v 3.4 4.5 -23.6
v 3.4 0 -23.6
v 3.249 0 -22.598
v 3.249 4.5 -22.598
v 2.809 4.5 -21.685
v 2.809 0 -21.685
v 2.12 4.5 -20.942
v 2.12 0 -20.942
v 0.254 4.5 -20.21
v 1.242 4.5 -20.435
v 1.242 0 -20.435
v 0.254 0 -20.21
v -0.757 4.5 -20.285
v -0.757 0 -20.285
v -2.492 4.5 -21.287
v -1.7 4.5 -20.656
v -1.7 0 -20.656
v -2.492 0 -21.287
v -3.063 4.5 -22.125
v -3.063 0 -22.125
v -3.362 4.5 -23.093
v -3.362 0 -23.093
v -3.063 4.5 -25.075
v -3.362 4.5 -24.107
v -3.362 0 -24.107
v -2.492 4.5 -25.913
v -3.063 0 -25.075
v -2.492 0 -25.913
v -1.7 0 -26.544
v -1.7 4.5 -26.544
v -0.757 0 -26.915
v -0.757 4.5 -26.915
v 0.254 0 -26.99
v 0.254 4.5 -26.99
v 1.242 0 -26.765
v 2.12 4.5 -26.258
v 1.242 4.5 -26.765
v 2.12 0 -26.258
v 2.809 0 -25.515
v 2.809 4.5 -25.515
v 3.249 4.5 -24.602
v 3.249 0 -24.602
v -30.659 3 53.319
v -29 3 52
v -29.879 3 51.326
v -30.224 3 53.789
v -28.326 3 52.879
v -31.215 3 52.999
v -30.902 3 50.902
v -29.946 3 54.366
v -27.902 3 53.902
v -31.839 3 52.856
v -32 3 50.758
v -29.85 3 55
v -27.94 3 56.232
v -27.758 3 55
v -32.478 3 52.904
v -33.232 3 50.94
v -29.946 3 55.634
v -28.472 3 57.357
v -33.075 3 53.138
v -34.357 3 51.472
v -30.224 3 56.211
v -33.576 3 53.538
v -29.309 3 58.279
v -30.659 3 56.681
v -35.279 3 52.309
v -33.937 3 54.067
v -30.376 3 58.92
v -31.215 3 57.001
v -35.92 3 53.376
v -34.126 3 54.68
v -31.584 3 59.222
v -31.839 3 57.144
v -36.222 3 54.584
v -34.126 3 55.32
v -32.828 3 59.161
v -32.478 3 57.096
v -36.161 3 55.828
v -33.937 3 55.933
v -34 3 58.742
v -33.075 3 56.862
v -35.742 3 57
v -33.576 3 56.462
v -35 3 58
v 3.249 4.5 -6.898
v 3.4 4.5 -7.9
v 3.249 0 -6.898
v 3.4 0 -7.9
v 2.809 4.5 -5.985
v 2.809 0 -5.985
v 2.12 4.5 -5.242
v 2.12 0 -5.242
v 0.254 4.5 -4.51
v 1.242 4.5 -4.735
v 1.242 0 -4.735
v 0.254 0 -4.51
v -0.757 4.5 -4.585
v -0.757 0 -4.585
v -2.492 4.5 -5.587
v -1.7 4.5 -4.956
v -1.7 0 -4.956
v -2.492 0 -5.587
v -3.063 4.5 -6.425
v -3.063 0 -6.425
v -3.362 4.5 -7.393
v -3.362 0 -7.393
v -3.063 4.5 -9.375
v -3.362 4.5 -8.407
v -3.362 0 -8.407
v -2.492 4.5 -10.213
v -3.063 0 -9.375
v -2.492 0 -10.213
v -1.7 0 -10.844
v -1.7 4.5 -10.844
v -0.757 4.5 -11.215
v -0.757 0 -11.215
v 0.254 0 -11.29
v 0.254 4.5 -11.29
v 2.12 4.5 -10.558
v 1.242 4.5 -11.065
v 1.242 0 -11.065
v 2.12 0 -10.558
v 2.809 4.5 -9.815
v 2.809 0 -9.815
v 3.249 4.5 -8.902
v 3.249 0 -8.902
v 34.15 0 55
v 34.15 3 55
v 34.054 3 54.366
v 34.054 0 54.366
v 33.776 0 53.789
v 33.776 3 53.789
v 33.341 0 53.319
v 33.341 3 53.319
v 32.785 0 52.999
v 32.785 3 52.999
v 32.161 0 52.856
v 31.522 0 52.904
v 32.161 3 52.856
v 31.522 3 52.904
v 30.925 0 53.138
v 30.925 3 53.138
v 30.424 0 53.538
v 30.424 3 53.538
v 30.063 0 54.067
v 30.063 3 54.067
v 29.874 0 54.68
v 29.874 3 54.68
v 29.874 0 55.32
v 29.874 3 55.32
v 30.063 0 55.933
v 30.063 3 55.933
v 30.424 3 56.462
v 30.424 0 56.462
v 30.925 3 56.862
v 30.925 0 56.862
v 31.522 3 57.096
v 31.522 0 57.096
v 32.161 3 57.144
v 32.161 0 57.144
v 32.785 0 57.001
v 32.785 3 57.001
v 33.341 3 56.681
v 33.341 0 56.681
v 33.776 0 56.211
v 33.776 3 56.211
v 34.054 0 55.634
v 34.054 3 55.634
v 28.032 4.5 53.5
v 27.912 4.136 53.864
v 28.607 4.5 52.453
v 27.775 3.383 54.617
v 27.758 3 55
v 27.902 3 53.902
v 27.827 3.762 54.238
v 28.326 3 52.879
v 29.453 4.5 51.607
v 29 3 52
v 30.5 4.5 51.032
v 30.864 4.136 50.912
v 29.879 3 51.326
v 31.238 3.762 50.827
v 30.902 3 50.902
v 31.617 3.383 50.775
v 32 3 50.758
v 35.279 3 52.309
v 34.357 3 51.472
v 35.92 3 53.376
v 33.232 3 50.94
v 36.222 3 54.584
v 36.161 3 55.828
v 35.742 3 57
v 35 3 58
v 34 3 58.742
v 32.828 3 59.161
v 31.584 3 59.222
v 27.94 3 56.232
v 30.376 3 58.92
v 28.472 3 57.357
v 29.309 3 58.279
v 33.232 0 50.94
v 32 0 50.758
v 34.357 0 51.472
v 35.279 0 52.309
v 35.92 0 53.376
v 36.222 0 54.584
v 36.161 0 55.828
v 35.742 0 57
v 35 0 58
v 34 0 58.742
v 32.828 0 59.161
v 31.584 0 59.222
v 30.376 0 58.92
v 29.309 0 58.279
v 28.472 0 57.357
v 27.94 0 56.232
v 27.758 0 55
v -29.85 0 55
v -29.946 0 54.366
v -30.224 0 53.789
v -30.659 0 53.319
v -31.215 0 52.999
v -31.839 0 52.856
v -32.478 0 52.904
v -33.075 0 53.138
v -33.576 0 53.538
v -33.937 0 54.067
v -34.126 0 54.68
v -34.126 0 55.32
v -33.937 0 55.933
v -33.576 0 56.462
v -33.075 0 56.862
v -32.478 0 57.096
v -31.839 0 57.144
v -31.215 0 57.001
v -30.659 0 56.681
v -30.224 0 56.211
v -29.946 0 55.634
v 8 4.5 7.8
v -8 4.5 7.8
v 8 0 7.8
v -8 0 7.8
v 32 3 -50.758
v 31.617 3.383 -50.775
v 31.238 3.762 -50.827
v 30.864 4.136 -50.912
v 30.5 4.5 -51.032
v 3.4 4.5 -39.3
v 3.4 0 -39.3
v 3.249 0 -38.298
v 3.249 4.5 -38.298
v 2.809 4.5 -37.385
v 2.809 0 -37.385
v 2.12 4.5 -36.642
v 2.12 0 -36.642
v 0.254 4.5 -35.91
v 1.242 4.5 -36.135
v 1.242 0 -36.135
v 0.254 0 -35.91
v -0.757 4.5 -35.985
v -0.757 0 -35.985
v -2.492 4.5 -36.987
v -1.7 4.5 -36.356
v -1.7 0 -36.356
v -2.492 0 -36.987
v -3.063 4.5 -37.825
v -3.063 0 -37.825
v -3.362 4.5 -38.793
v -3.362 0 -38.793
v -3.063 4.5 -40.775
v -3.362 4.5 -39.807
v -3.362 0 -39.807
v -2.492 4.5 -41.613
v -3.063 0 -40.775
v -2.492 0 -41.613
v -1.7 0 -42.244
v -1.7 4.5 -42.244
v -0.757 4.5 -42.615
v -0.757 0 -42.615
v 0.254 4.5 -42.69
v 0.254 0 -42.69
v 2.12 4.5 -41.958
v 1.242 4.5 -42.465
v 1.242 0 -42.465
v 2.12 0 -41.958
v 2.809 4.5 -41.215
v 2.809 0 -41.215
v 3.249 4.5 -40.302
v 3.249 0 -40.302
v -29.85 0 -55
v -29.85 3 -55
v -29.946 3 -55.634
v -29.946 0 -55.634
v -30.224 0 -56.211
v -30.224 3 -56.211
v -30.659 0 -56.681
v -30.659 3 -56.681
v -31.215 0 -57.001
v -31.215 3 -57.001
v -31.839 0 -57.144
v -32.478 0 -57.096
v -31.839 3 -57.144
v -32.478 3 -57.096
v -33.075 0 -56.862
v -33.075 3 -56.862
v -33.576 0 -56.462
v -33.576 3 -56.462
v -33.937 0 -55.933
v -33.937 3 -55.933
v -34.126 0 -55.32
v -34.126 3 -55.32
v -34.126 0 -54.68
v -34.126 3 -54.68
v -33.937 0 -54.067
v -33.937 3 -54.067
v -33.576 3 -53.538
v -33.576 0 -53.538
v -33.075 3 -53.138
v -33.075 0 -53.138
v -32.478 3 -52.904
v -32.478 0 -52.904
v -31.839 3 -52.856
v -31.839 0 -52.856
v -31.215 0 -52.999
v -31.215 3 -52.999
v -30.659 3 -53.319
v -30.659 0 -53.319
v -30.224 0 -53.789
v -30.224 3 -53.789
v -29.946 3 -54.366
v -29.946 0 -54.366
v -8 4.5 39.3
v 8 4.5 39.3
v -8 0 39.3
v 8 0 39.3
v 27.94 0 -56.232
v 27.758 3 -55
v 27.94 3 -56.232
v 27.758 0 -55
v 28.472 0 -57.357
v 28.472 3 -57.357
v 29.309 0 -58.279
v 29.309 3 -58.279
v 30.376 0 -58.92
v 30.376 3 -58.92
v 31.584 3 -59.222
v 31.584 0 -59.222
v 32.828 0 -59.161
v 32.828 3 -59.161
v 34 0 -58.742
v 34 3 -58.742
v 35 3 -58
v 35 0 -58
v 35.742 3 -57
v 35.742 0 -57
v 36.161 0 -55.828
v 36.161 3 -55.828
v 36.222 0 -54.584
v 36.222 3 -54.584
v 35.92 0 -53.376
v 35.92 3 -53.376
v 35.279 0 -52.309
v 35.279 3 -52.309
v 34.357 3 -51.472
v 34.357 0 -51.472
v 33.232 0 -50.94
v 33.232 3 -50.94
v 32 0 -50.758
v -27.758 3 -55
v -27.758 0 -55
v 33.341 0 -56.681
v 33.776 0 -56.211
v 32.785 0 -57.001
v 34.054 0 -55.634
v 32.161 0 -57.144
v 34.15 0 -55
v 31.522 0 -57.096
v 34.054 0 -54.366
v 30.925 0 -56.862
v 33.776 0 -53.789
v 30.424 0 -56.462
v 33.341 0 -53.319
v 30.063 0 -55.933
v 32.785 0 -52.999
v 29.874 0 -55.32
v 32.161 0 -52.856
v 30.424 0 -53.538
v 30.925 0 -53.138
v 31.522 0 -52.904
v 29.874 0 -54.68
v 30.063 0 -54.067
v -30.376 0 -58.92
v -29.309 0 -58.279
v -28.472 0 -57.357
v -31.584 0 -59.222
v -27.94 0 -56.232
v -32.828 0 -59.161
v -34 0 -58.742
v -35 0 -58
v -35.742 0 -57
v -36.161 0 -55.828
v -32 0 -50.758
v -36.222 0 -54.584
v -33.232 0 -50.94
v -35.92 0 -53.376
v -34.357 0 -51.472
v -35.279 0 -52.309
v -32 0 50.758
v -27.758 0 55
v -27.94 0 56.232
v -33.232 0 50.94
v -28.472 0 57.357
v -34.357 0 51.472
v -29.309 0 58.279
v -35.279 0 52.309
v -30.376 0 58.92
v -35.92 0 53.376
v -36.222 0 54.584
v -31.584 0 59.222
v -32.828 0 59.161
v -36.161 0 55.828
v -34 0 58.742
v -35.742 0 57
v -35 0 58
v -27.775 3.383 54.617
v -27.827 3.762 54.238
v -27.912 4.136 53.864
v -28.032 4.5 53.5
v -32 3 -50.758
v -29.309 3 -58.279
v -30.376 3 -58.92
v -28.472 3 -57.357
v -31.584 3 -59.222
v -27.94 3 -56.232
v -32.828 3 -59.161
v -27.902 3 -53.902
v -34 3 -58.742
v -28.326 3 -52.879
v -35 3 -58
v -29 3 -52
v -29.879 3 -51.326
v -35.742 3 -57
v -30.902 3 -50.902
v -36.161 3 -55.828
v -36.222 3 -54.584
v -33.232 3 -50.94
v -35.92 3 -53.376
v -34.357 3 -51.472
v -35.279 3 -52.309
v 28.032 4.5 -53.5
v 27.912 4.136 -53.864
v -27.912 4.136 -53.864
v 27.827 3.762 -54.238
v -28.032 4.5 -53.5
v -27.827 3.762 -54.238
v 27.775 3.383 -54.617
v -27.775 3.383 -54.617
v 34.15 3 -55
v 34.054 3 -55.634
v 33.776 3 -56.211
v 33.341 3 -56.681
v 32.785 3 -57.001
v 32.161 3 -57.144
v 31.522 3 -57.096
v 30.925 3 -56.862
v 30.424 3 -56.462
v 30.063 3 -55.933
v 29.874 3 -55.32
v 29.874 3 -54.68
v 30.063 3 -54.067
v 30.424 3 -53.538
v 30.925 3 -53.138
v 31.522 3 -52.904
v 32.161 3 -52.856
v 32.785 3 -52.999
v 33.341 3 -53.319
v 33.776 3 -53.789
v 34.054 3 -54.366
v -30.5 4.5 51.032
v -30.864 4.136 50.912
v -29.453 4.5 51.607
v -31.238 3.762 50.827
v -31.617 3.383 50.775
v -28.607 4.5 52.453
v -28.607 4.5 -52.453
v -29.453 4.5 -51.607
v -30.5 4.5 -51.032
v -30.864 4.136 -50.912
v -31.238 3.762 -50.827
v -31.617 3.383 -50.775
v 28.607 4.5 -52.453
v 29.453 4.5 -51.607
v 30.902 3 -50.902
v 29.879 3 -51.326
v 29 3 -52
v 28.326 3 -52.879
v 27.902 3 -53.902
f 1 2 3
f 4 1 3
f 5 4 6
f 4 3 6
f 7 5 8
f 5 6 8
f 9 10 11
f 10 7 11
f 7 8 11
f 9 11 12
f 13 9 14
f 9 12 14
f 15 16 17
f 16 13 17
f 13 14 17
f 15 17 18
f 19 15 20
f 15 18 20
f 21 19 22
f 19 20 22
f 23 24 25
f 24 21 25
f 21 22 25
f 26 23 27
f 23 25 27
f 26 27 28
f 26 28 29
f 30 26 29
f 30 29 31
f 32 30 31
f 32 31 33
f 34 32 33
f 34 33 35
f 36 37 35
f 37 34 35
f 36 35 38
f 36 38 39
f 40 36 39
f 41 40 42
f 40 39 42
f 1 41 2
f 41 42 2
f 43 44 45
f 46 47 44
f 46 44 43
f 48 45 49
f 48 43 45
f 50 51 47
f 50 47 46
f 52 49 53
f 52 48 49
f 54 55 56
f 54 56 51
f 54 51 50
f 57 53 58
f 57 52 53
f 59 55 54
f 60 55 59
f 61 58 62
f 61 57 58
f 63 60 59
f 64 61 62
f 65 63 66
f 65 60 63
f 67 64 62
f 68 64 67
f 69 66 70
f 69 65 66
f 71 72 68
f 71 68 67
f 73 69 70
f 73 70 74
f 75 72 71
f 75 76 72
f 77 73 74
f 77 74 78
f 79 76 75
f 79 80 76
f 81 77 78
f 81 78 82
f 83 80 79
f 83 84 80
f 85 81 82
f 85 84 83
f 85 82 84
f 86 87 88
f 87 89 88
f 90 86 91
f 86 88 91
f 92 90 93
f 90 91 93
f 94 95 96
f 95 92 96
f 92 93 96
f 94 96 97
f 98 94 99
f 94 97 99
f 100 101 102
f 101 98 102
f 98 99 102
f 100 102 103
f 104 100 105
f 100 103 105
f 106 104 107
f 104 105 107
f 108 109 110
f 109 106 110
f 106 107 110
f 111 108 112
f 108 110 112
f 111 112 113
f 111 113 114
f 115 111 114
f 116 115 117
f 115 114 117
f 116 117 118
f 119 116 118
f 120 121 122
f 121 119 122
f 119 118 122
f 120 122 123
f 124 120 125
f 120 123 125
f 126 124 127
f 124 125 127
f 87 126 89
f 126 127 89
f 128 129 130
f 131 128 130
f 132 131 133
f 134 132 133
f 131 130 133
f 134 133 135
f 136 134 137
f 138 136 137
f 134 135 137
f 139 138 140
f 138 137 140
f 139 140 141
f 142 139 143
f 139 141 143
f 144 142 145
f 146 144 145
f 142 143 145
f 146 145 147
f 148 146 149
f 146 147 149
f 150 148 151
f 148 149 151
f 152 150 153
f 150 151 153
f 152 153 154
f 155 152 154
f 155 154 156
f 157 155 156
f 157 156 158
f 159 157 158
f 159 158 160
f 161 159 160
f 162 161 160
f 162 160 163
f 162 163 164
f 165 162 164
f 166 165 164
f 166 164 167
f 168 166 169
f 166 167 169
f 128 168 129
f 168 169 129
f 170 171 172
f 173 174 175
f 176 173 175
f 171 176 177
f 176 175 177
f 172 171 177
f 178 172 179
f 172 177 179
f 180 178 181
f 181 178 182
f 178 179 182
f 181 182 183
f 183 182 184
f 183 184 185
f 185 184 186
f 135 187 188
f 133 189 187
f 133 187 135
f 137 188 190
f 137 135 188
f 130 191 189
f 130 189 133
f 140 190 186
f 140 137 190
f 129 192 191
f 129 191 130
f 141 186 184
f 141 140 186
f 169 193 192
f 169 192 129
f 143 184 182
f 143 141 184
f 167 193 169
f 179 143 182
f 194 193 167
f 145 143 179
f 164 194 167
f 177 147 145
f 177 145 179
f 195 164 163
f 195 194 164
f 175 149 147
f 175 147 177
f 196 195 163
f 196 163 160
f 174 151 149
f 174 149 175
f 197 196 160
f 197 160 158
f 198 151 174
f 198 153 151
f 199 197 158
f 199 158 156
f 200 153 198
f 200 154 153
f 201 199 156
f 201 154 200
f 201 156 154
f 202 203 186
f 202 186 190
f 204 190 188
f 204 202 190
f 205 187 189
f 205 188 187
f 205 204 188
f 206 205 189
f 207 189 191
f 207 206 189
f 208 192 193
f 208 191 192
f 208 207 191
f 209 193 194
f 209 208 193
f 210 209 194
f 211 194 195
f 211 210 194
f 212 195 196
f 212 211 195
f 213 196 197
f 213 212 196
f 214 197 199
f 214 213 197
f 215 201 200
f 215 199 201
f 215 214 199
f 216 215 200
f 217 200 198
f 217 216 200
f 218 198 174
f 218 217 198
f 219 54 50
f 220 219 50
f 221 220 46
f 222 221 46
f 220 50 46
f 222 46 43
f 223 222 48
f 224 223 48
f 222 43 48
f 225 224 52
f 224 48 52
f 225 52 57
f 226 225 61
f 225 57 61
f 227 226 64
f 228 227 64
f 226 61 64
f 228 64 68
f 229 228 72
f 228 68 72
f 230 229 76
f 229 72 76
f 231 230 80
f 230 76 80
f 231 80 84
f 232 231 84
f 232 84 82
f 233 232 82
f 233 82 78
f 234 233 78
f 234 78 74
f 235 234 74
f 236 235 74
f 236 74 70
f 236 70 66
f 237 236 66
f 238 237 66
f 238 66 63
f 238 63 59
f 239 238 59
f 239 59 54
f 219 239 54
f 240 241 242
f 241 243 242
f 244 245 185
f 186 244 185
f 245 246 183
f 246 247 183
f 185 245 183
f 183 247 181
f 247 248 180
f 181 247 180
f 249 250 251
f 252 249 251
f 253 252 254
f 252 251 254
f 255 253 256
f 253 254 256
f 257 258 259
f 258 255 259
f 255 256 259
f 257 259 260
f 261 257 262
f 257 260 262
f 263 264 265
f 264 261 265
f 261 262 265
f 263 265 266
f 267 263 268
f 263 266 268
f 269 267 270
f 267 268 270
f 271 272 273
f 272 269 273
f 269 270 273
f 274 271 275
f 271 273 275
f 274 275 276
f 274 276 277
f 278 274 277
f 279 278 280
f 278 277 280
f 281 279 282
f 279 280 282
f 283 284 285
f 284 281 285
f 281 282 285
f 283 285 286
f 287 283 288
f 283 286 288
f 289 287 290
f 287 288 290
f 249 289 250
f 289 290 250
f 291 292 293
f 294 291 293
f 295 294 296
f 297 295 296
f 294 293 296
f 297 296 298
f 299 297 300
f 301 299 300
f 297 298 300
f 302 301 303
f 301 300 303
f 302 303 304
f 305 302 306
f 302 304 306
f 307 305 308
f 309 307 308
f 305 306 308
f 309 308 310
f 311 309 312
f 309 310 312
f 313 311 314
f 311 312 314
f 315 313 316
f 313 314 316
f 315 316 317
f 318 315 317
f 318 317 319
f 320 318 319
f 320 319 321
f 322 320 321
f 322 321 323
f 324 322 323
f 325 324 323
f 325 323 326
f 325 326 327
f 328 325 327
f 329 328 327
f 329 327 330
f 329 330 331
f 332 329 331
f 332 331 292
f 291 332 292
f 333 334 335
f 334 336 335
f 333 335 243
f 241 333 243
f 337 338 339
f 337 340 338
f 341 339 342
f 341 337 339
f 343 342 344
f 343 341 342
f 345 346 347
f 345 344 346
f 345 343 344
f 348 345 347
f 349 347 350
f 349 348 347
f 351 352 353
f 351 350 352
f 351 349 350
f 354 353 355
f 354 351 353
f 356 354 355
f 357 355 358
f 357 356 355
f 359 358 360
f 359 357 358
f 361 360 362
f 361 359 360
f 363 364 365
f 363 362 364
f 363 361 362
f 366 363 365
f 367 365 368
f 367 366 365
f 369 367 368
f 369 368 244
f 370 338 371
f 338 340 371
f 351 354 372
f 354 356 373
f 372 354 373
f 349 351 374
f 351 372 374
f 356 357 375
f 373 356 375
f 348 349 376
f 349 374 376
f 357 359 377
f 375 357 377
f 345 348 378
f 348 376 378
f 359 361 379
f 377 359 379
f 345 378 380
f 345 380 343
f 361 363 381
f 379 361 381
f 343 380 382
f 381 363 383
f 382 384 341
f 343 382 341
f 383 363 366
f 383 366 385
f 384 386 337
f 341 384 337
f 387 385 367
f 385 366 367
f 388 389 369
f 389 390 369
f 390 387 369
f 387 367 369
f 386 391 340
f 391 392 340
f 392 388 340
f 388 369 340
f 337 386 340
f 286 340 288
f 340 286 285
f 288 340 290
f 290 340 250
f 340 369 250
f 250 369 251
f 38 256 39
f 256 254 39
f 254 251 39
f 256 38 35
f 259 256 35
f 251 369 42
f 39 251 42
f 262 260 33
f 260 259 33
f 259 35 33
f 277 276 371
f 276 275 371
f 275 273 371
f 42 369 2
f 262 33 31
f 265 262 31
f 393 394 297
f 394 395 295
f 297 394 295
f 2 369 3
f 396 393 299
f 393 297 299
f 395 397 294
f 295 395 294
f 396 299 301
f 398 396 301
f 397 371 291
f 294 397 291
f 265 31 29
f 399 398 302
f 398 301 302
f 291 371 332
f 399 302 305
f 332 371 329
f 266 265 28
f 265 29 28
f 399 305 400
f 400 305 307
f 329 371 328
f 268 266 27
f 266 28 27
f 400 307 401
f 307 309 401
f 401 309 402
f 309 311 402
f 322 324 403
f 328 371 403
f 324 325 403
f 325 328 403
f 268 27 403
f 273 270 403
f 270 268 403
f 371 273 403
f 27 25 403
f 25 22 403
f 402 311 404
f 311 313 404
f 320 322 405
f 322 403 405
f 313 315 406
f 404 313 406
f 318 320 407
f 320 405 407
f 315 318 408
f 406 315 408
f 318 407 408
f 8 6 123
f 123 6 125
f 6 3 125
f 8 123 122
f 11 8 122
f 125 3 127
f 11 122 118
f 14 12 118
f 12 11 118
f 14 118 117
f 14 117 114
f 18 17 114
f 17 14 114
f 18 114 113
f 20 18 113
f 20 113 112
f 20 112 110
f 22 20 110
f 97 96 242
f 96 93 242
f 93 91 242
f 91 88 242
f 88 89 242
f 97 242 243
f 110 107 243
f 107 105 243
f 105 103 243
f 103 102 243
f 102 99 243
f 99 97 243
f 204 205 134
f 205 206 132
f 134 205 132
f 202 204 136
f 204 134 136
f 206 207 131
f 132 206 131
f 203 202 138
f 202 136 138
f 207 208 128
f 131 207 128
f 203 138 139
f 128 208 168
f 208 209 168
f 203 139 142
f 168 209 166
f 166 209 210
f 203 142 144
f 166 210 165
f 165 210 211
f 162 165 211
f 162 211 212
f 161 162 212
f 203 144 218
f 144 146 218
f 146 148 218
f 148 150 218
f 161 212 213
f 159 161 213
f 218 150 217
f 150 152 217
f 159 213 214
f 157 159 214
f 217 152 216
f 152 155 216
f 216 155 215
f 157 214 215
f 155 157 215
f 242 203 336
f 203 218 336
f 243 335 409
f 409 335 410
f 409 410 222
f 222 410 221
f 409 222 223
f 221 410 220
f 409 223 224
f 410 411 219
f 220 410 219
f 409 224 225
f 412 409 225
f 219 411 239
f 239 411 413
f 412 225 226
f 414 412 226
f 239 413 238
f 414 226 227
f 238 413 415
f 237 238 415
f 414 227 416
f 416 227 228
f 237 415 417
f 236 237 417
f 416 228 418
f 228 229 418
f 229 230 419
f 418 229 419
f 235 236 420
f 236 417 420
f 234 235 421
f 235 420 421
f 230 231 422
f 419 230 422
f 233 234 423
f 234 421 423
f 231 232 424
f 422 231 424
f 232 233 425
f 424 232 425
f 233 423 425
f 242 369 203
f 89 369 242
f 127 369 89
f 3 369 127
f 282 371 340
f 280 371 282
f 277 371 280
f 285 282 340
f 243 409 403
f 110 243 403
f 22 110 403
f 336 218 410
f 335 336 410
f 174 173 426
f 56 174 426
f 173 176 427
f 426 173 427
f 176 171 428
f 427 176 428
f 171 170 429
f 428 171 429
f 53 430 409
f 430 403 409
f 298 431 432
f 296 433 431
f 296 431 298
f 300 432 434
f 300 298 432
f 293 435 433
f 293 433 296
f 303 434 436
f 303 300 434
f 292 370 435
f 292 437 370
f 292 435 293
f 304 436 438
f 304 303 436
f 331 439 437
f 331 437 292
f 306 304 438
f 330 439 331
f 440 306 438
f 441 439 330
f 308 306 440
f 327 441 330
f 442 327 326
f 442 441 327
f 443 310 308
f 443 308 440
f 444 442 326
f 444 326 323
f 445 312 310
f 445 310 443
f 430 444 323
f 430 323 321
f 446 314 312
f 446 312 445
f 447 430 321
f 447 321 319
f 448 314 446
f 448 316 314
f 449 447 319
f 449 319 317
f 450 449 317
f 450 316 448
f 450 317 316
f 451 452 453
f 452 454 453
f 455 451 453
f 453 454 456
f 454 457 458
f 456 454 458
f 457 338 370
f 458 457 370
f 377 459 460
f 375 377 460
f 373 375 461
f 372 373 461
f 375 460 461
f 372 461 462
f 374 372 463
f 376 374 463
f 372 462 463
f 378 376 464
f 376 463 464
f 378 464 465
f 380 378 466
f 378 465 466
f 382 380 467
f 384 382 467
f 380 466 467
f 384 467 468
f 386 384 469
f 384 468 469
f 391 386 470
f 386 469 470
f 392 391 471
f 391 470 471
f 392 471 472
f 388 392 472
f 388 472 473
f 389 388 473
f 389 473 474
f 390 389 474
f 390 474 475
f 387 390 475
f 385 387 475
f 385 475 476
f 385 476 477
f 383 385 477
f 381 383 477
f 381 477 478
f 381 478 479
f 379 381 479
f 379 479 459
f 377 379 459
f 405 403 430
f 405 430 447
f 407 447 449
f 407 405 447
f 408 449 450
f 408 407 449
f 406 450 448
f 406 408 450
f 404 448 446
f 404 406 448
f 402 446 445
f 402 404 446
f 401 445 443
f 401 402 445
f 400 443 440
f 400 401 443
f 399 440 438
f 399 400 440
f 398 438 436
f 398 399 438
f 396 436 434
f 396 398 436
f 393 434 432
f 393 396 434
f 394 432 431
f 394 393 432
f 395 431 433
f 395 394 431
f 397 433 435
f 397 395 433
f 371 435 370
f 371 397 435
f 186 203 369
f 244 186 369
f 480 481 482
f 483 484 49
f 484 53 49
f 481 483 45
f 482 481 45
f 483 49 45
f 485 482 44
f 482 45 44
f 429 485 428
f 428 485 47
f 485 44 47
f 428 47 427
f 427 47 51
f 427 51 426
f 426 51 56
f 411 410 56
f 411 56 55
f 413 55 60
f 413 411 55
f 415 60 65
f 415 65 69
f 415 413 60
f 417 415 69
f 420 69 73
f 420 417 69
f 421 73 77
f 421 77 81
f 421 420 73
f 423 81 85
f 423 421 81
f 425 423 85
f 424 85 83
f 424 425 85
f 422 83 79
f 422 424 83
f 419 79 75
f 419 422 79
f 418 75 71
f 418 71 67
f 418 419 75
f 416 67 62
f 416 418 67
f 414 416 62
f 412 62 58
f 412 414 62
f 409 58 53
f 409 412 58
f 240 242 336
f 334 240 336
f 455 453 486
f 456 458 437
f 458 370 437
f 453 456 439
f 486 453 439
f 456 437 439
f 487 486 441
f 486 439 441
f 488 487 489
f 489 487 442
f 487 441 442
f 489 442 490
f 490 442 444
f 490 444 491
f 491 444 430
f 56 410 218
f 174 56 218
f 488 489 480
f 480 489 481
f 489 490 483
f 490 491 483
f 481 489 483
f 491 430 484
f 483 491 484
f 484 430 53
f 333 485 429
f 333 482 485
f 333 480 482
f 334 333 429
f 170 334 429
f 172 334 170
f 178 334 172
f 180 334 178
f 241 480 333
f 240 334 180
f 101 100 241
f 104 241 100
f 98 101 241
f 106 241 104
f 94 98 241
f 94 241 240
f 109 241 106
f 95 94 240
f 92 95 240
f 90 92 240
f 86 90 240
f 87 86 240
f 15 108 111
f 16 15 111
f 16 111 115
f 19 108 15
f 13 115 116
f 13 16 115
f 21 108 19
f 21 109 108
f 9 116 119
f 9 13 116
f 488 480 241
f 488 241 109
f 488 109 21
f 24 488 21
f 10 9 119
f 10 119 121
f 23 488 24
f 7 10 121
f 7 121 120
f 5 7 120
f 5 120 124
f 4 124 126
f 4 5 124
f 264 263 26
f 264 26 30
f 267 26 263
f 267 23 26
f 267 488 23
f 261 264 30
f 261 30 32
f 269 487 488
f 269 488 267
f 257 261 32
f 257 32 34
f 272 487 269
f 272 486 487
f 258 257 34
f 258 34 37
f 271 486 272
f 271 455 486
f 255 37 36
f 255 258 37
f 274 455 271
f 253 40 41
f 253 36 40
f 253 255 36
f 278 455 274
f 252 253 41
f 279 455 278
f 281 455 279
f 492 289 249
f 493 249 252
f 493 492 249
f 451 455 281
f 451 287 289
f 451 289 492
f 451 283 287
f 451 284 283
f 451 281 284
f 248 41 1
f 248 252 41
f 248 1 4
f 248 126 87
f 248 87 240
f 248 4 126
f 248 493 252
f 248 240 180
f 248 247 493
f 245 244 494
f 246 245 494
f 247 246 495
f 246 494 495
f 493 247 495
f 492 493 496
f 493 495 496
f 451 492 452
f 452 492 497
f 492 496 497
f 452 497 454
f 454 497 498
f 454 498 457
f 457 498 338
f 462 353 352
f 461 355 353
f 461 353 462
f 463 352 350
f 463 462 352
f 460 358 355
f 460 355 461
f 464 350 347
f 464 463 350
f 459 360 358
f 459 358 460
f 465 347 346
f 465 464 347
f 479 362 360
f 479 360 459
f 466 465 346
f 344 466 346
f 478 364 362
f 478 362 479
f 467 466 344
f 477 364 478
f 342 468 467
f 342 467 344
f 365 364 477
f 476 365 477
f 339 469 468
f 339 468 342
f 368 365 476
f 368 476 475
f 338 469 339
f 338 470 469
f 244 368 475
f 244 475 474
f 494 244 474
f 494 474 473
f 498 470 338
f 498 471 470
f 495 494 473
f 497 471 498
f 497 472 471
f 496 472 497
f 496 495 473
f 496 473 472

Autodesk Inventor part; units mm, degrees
ref_plane "YZ Plane" through (0, 0, 0) normal (1, 0, 0) x (0, 1, 0)
ref_plane "XZ Plane" through (0, 0, 0) normal (0, 1, 0) x (-1, 0, 0)
ref_plane "XY Plane" through (0, 0, 0) normal (0, 0, 1) x (1, 0, 0)
sketch "Sketch1" plane through (0, 0, 0) normal (0, 1, 0) x (-1, 0, 0)
  line L0 (32, 55) -> (-32, 55)
  line L1 (-32, 55) -> (-32, -55)
  line L2 (-32, -55) -> (32, -55)
  line L3 (32, -55) -> (32, 55)
  line L4 (32, 55) -> (-32, -55) construction
  line L5 (-32, 55) -> (32, -55) construction
  circle A0 centre (32, 55) radius 4.2425
  circle A1 centre (32, -55) radius 4.2425
  circle A2 centre (-32, 55) radius 4.2425
  circle A3 centre (-32, -55) radius 4.2425
  point P0 (0, 0)
  dimension "d0" = 64
  dimension "d1" = 110
  dimension "d2" = 8.485
  dimension "d5" = 110
  dimension "d8" = 64
extrude "Extrusion1" add sketch "Sketch1" along normal blind 3
sketch "Sketch2" plane through (0, 3, 0) normal (0, 1, 0) x (1, 0, 0)
  line L0 (32, -50.7575) -> (32, 50.7575) projected
  arc A0 (32, 50.7575) -> (27.7575, 55) centre (32, 55) ccw projected
  line L1 (27.7575, 55) -> (-27.7575, 55) projected
  arc A1 (-27.7575, 55) -> (-32, 50.7575) centre (-32, 55) ccw projected
  line L2 (-32, 50.7575) -> (-32, -50.7575) projected
  arc A2 (-32, -50.7575) -> (-27.7575, -55) centre (-32, -55) ccw projected
  line L3 (-27.7575, -55) -> (27.7575, -55) projected
  arc A3 (27.7575, -55) -> (32, -50.7575) centre (32, -55) ccw projected
  circle A4 centre (-32, -55) radius 2.15
  circle A5 centre (-32, 55) radius 2.15
  circle A6 centre (32, -55) radius 2.15
  circle A7 centre (32, 55) radius 2.15
  point P0 (0, 0)
  dimension "d13" = 4.3
  dimension "d16" = 110
  dimension "d19" = 64
extrude "Extrusion2" cut sketch "Sketch2" against normal blind 3 contours A4 | A5 | A6 | A7
sketch "Sketch3" plane through (0, 3, 0) normal (0, 1, 0) x (1, 0, 0)
  line L0 (-8, -39.3) -> (8, -39.3)
  line L1 (8, -39.3) -> (8, -7.8)
  line L2 (8, -7.8) -> (-8, -7.8)
  line L3 (-8, -7.8) -> (-8, -39.3)
  line L4 (-32, 50.7575) -> (-32, -50.7575) projected
  line L5 (32, -50.7575) -> (32, 50.7575) projected
  line L6 (-27.7575, -55) -> (27.7575, -55) projected
  point P0 (0, 0)
  dimension "d24" = 16
  dimension "d25" = 31.5
  dimension "d26" = 24
  dimension "d27" = 24
  dimension "d28" = 15.7
extrude "Extrusion3" cut sketch "Sketch3" against normal blind 3
sketch "Sketch4" plane through (0, 3, 0) normal (0, 1, 0) x (1, 0, 0)
  circle A0 centre (0, 7.9) radius 3.4
  line L0 (0, 82.9395) -> (0, -82.9395) projected
  circle A1 centre (0, 23.6) radius 3.4
  circle A2 centre (0, 39.3) radius 3.4
  line L1 (27.7575, 55) -> (-27.7575, 55) projected
  line L2 (-8, -7.8) -> (8, -7.8) projected
  point P0 (0, 0)
  dimension "d31" = 6.8
  dimension "d32" = 6.8
  dimension "d33" = 6.8
  dimension "d34" = 15.7
  dimension "d35" = 15.7
  dimension "d36" = 15.7
  dimension "d37" = 15.7
extrude "Extrusion4" cut sketch "Sketch4" against normal blind 3
sketch "Sketch5" plane through (0, 3, 0) normal (0, 1, 0) x (1, 0, 0)
  circle A0 centre (0, 23.6) radius 3.4 projected
  circle A1 centre (0, 7.9) radius 3.4 projected
  circle A2 centre (0, 39.3) radius 3.4 projected
  line L0 (8, -7.8) -> (8, -39.3) projected
  line L1 (8, -39.3) -> (-8, -39.3) projected
  line L2 (-8, -39.3) -> (-8, -7.8) projected
  line L3 (-8, -7.8) -> (8, -7.8) projected
  circle A3 centre (32, -55) radius 2.15 projected
  circle A4 centre (-32, -55) radius 2.15 projected
  circle A5 centre (-32, 55) radius 2.15 projected
  circle A6 centre (32, 55) radius 2.15 projected
  line L4 (32, -50.7575) -> (32, 50.7575) projected
  arc A7 (32, 50.7575) -> (27.7575, 55) centre (32, 55) ccw projected
  line L5 (27.7575, 55) -> (-27.7575, 55) projected
  arc A8 (-27.7575, 55) -> (-32, 50.7575) centre (-32, 55) ccw projected
  line L6 (-32, 50.7575) -> (-32, -50.7575) projected
  arc A9 (-32, -50.7575) -> (-27.7575, -55) centre (-32, -55) ccw projected
  line L7 (-27.7575, -55) -> (27.7575, -55) projected
  arc A10 (27.7575, -55) -> (32, -50.7575) centre (32, -55) ccw projected
  circle A11 centre (-32, -55) radius 2.15 projected
  circle A12 centre (-32, -55) radius 4.2425
  circle A13 centre (-32, 55) radius 4.2425
  circle A14 centre (32, -55) radius 4.2425
  circle A15 centre (32, 55) radius 4.2425
  line L8 (-32, -50.7575) -> (-32, 50.7575)
  line L9 (-27.7575, 55) -> (27.7575, 55)
  line L10 (32, -50.7575) -> (32, 50.7575) projected
  line L11 (32, 50.7575) -> (32, -50.7575)
  line L12 (-27.7575, -55) -> (27.7575, -55) projected
  line L13 (27.7575, -55) -> (-27.7575, -55)
  point P0 (0, 0)
  dimension "d42" = 110
  dimension "d45" = 64
extrude "Extrusion5" add sketch "Sketch5" along normal blind 1.5 contours A14 L7 A12 L6 A13 L5 A15 L4
chamfer "Chamfer1" distance 1.5 angle 45 4 edges at (-32, 4.5, 0) (0, 4.5, 55) (32, 4.5, 0) (0, 4.5, -55)
equation "\"d26\" = d27"
equation "\"d32\" = d31"
equation "\"d33\" = d31"
equation "\"d34\" = d37"
equation "\"d35\" = d34"
equation "\"d36\" = d34"
properties part number "gora"
